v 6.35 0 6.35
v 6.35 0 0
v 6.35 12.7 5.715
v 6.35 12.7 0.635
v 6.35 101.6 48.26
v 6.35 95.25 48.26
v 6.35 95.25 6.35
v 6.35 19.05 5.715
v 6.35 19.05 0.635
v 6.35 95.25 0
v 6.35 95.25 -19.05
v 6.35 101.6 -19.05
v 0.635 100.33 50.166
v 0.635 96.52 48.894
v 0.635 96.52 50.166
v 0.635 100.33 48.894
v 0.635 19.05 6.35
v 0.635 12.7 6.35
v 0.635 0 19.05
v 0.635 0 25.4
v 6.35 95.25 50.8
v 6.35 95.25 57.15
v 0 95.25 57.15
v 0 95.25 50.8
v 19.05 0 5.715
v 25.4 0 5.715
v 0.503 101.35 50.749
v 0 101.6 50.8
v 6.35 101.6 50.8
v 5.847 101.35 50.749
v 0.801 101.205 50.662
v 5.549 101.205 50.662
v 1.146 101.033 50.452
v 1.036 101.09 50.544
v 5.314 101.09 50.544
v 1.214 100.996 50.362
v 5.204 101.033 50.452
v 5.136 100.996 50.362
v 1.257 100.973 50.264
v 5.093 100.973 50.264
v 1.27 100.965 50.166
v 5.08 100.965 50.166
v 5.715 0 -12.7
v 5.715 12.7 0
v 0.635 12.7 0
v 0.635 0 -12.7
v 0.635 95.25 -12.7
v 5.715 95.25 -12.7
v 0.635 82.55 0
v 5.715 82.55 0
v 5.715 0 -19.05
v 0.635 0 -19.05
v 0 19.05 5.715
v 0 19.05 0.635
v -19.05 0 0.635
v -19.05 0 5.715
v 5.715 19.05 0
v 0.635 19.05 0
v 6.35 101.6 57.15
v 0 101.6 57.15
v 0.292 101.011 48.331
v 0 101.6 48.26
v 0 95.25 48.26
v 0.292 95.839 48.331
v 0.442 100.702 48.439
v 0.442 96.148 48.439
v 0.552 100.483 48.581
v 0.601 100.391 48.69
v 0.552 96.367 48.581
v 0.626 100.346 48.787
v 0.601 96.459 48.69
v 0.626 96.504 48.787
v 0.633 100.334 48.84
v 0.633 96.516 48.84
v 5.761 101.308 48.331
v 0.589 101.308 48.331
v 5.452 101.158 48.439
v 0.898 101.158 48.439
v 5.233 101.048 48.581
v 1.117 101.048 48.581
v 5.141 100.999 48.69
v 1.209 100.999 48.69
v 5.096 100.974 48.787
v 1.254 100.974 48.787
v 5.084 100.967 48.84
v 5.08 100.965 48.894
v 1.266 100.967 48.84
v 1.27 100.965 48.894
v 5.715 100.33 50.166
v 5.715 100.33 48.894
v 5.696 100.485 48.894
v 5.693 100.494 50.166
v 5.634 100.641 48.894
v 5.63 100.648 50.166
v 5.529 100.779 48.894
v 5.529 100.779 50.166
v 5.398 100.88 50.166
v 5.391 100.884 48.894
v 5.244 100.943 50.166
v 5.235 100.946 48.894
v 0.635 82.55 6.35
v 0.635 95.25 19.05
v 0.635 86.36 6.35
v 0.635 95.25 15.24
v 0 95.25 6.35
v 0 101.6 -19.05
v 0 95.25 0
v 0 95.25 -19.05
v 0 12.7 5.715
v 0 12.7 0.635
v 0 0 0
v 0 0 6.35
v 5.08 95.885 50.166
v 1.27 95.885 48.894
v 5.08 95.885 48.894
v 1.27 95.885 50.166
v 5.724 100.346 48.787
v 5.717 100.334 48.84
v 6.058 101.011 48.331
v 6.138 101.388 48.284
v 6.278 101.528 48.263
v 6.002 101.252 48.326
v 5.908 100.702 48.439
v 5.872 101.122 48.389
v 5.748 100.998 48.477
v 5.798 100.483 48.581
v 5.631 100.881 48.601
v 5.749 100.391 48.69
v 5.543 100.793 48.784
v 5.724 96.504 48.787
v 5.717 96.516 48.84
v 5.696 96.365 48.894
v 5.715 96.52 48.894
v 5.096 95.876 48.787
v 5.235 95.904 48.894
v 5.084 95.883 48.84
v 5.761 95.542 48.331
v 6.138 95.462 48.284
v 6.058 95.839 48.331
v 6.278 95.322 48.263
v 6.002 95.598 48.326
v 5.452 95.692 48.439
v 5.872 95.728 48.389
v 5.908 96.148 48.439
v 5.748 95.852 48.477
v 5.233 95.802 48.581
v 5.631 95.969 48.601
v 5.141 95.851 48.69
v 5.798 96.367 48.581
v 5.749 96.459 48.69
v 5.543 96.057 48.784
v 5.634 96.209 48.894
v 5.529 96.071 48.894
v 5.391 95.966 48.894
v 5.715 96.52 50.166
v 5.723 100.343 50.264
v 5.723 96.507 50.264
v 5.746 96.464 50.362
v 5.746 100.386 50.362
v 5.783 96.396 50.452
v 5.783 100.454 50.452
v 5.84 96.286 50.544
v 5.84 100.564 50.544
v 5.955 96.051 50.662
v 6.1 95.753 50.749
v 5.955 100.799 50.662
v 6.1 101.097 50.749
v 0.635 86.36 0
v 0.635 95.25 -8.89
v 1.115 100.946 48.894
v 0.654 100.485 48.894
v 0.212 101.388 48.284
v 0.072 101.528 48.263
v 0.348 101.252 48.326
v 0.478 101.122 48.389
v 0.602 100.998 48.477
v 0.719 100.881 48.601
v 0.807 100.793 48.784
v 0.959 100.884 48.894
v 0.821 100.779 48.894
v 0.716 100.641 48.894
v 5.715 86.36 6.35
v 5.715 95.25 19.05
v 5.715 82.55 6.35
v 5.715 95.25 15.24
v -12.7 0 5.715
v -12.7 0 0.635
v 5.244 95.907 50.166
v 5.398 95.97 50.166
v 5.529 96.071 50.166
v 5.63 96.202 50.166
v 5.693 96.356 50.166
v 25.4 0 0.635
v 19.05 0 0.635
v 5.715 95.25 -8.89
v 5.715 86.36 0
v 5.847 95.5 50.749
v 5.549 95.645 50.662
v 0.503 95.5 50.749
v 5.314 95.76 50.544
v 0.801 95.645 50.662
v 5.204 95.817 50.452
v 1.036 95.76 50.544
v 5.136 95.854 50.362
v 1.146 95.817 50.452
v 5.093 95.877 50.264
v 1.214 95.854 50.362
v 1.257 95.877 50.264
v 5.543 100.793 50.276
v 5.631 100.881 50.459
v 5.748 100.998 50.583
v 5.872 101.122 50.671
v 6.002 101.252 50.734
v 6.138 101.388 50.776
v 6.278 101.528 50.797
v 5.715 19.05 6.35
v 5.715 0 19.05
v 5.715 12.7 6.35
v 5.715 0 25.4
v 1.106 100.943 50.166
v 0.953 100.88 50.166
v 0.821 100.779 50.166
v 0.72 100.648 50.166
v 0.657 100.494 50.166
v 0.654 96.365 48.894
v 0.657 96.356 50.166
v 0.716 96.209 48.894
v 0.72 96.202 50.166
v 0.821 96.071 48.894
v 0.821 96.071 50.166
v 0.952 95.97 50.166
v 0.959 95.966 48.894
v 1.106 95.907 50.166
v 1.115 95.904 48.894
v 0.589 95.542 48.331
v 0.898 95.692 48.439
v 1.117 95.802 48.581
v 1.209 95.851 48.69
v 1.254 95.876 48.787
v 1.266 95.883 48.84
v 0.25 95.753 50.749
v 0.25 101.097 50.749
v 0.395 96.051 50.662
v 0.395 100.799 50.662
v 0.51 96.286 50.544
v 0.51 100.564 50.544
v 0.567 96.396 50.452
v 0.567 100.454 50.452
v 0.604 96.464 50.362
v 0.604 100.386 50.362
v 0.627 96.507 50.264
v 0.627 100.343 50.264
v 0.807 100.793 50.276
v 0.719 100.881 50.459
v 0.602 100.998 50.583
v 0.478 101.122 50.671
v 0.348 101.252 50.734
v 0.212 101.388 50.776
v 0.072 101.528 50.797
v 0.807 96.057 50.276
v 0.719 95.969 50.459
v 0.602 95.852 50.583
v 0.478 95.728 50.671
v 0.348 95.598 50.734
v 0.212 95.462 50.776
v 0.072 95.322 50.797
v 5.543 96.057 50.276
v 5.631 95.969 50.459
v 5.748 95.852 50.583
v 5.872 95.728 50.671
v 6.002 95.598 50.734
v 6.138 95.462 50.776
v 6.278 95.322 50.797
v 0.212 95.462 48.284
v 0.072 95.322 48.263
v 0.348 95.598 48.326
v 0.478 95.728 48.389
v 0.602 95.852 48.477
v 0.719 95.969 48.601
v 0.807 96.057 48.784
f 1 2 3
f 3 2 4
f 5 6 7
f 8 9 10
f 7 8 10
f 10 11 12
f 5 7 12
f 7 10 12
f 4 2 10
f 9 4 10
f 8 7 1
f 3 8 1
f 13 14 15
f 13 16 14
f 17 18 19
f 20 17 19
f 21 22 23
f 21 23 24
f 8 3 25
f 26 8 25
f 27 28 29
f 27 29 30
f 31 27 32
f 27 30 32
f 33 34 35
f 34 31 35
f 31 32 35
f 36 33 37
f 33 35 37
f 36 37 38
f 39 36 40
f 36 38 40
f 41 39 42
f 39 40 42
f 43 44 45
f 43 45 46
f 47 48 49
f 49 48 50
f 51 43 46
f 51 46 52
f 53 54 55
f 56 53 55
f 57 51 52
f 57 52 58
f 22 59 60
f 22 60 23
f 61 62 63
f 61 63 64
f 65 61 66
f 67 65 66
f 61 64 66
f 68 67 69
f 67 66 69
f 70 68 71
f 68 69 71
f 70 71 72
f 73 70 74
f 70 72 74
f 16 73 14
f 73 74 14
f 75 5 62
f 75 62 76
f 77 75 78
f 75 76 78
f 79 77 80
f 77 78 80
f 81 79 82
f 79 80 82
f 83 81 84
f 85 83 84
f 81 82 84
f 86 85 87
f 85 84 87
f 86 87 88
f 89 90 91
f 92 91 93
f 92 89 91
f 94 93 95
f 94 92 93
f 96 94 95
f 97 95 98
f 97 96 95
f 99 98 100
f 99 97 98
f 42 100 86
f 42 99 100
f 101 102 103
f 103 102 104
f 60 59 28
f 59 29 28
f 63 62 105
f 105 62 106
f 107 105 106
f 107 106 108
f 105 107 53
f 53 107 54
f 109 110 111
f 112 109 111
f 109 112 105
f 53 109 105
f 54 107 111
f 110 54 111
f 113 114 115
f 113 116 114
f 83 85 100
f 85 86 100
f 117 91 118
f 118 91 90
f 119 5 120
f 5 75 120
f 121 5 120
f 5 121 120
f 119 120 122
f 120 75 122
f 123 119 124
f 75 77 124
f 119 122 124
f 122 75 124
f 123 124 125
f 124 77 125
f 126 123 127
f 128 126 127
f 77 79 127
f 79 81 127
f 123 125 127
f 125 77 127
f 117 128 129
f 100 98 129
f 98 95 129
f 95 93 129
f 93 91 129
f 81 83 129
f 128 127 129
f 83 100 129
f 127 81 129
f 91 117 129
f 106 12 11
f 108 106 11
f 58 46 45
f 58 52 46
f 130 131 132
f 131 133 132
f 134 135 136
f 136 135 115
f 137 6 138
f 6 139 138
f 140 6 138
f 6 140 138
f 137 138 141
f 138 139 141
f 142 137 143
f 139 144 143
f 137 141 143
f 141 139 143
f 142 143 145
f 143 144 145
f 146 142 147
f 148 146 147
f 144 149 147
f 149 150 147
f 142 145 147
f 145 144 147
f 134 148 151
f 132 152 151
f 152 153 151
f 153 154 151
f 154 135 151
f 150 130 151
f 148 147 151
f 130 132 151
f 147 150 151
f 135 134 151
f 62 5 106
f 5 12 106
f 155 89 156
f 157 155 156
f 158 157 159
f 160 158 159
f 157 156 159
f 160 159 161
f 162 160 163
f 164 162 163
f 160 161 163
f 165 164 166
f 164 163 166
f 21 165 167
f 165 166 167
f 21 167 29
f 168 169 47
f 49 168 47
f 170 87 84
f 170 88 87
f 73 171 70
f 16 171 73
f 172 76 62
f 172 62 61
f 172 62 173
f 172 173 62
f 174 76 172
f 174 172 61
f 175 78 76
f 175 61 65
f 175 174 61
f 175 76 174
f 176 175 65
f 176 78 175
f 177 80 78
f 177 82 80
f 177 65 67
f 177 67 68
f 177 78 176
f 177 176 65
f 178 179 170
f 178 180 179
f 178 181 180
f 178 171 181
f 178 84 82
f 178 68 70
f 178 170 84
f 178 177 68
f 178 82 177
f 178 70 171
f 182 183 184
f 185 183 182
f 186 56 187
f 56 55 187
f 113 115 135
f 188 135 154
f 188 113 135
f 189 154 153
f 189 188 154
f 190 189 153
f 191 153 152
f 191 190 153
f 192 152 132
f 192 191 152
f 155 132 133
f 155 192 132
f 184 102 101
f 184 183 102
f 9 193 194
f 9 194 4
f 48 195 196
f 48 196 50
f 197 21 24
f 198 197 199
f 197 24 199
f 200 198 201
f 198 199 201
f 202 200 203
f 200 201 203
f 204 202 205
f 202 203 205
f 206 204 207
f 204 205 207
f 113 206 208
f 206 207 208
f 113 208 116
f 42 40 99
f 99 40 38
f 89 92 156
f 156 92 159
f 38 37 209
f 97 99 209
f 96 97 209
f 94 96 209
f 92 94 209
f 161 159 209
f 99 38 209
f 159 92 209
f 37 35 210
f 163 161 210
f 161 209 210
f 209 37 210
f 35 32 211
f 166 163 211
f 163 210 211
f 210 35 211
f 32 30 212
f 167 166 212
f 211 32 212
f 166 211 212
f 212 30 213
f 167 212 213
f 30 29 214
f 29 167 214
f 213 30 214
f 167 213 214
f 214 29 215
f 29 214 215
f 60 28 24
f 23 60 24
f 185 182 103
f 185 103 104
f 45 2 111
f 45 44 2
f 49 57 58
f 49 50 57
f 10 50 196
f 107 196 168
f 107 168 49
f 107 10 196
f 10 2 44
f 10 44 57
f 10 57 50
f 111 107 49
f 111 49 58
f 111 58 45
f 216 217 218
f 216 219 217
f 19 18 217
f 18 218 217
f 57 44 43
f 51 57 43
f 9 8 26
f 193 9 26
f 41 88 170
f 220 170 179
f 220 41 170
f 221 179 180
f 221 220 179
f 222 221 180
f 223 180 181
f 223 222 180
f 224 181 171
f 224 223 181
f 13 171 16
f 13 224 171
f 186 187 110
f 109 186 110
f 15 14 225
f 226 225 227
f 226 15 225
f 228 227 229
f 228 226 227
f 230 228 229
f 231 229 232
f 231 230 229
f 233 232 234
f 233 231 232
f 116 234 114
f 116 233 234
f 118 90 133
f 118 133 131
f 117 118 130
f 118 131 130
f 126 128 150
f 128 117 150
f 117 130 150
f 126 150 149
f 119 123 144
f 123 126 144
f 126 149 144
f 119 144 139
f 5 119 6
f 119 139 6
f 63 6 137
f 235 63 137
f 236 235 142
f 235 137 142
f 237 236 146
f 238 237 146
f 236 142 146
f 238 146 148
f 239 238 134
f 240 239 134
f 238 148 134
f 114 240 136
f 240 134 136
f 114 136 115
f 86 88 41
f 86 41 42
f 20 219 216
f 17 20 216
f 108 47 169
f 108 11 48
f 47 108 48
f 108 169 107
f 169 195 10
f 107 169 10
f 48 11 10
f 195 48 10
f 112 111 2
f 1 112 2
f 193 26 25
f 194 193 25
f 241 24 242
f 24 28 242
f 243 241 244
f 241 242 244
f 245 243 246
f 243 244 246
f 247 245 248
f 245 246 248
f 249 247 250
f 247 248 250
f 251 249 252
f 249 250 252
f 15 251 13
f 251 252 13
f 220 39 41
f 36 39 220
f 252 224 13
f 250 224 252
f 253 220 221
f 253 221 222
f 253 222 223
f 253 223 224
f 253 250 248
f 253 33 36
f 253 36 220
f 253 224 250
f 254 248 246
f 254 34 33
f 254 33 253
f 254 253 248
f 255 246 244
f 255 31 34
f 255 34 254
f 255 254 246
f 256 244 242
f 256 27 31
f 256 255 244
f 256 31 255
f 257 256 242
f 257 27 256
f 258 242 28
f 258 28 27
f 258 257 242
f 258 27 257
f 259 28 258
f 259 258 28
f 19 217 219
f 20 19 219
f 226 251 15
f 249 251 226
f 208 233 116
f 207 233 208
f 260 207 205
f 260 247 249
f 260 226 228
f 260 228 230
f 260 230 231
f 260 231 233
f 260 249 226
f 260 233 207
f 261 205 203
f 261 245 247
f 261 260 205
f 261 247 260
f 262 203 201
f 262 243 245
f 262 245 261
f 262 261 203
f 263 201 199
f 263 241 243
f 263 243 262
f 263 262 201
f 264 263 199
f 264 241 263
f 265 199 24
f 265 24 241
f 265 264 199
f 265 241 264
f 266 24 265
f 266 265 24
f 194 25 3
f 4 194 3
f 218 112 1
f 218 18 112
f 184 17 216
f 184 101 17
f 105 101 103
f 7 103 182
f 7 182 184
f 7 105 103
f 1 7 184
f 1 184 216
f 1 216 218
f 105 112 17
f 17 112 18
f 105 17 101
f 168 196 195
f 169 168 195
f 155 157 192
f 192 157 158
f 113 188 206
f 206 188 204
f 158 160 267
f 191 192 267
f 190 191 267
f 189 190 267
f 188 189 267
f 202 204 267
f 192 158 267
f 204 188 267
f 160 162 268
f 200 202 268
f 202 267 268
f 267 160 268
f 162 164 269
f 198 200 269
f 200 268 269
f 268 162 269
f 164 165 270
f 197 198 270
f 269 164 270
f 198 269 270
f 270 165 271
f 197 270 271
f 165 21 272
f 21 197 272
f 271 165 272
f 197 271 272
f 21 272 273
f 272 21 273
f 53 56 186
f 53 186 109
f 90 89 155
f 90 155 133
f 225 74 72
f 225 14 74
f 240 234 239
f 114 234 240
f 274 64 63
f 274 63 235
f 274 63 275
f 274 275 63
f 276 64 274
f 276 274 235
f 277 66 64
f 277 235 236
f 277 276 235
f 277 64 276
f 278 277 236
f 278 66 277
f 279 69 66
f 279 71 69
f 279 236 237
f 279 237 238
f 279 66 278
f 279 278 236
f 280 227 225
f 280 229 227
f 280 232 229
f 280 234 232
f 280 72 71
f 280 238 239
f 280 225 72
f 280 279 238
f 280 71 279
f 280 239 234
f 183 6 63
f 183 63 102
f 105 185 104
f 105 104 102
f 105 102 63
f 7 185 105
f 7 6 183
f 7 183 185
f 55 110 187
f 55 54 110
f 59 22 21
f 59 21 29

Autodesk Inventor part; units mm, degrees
ref_plane "YZ Plane" through (0, 0, 0) normal (1, 0, 0) x (0, 1, 0)
ref_plane "XZ Plane" through (0, 0, 0) normal (0, 1, 0) x (-1, 0, 0)
ref_plane "XY Plane" through (0, 0, 0) normal (0, 0, 1) x (1, 0, 0)
sketch "Sketch1" plane through (0, 0, 0) normal (0, 0, 1) x (1, 0, 0)
  line L0 (0, 0) -> (6.35, 0)
  line L1 (6.35, 0) -> (6.35, 101.6)
  line L2 (6.35, 101.6) -> (0, 101.6)
  line L3 (0, 101.6) -> (0, 0)
  dimension "d0" = 6.35
  dimension "d1" = 101.6
extrude "Extrusion1" add sketch "Sketch1" along normal blind 6.35
sketch "Sketch2" plane through (6.35, 0, 0) normal (1, 0, 0) x (0, 0, -1)
  line L0 (-19.05, 0) -> (-25.4, 0)
  line L1 (-25.4, 0) -> (-6.35, 19.05)
  line L2 (-6.35, 0) -> (-6.35, 101.6) projected
  line L3 (-25.4, 0) -> (1.5408, 0) construction
  line L4 (-6.35, 19.05) -> (-6.35, 12.7)
  line L5 (-6.35, 12.7) -> (-19.05, 0)
  point P0 (0, 0)
  dimension "d5" = 19.05
  dimension "d6" = 45
  dimension "d7" = 6.35
extrude "Extrusion2" add sketch "Sketch2" against normal blind 6.35
sketch "Sketch3" plane through (6.35, 0, 0) normal (1, 0, 0) x (0, 0, -1)
  line L0 (12.7, 0) -> (19.05, 0)
  line L1 (19.05, 0) -> (0, 19.05)
  line L2 (0, 101.6) -> (0, 0) projected
  line L3 (0, 19.05) -> (0, 12.7)
  line L4 (0, 12.7) -> (12.7, 0)
  dimension "d10" = 19.05
  dimension "d11" = 45
  dimension "d12" = 6.35
extrude "Extrusion3" add sketch "Sketch3" against normal blind 6.35
sketch "Sketch4" plane through (0, 0, 6.35) normal (0, 0, 1) x (1, 0, 0)
  line L0 (6.35, 19.05) -> (25.4, 0)
  line L1 (6.35, 19.05) -> (33.2908, 19.05) construction
  line L2 (25.4, 0) -> (19.05, 0)
  line L3 (0, 0) -> (6.35, 0) projected
  line L4 (19.05, 0) -> (6.35, 12.7)
  line L5 (6.35, 12.7) -> (6.35, 19.05)
  line L6 (6.35, 0) -> (6.35, 12.7) projected
  dimension "d15" = 45
  dimension "d16" = 6.35
extrude "Extrusion4" add sketch "Sketch4" against normal blind 6.35
sketch "Sketch5" plane through (0, 0, 0) normal (0, 0, -1) x (-1, 0, 0)
  line L0 (0, 19.05) -> (19.05, 0)
  line L1 (0, 19.05) -> (26.9408, 19.05) construction
  line L2 (19.05, 0) -> (12.7, 0)
  line L3 (0, 19.05) -> (0, 0) projected
  line L4 (12.7, 0) -> (0, 12.7)
  line L5 (0, 12.7) -> (0, 19.05)
  dimension "d19" = 45
  dimension "d20" = 6.35
extrude "Extrusion5" add sketch "Sketch5" against normal blind 6.35
sketch "Sketch6" plane through (6.35, 101.6, 6.35) normal (1, 0, 0) x (0, 0, -1)
  line L0 (0, 0) -> (-50.8, 0)
  line L1 (-50.8, 0) -> (-50.8, -6.35)
  line L2 (-50.8, -6.35) -> (0, -6.35)
  line L3 (0, -6.35) -> (0, 0)
  line L4 (6.35, 0) -> (25.4, 0)
  line L5 (25.4, 0) -> (25.4, -6.35)
  line L6 (25.4, -6.35) -> (6.35, -6.35)
  line L7 (6.35, -6.35) -> (6.35, 0)
  point P0 (6.35, -101.6)
  dimension "d23" = 50.8
  dimension "d24" = 6.35
  dimension "d25" = 19.05
extrude "Extrusion6" add sketch "Sketch6" against normal blind 6.35
sketch "Sketch7" plane through (6.35, 19.05, 6.35) normal (1, 0, 0) x (0, 0, -1)
  line L0 (-8.89, 76.2) -> (-12.7, 76.2)
  line L1 (-50.8, 76.2) -> (0, 76.2) projected
  line L2 (-12.7, 76.2) -> (0, 63.5)
  line L3 (0, 0) -> (0, 76.2) projected
  line L4 (0, 63.5) -> (0, 67.31)
  line L5 (0, 67.31) -> (-8.89, 76.2)
  point P0 (6.35, -19.05)
  dimension "d28" = 12.7
  dimension "d29" = 45
  dimension "d30" = 3.81
extrude "Extrusion7" add sketch "Sketch7" against normal blind 5.715 contours L5 L3 L2 L0
extrude "Extrusion8" cut sketch "Sketch7" against normal blind 0.635 contours L5 L3 L2 L0
sketch "Sketch9" plane through (0, 0, 6.35) normal (0, 0, 1) x (1, 0, 0)
  point P0 (0, 0)
extrude "Extrusion9" cut sketch "Sketch4" against normal blind 0.635
sketch "Sketch10" plane through (0, 0, 0) normal (0, 0, -1) x (-1, 0, 0)
  line L0 (-25.4, 0) -> (-19.05, 0)
  line L1 (-25.4, 0) -> (-19.05, 0) projected
  line L2 (-19.05, 0) -> (-6.35, 12.7)
  line L3 (-19.05, 0) -> (-6.35, 12.7) projected
  line L4 (-6.35, 12.7) -> (-6.35, 19.05)
  line L5 (-6.35, 0) -> (-6.35, 19.05) projected
  line L6 (-6.35, 19.05) -> (-25.4, 0)
  line L7 (-6.35, 19.05) -> (-25.4, 0) projected
  point P0 (0, 0)
extrude "Extrusion10" cut sketch "Sketch10" against normal blind 0.635
sketch "Sketch11" plane through (6.35, 0, 6.35) normal (1, 0, 0) x (0, 0, -1)
  line L0 (6.35, 19.05) -> (6.35, 12.7)
  line L1 (6.35, 0) -> (6.35, 12.7) projected
  line L2 (6.35, 12.7) -> (19.05, 0)
  line L3 (6.35, 12.7) -> (19.05, 0) projected
  line L4 (19.05, 0) -> (25.4, 0)
  line L5 (19.05, 0) -> (25.4, 0) projected
  line L6 (25.4, 0) -> (6.35, 19.05)
  line L7 (25.4, 0) -> (6.35, 19.05) projected
extrude "Extrusion11" cut sketch "Sketch11" against normal blind 0.635
sketch "Sketch12" plane through (0, 0, -19.05) normal (-1, 0, 0) x (0, 0, 1)
  line L0 (0, 0) -> (6.35, 0)
  line L1 (0, 0) -> (6.35, 0) projected
  line L2 (6.35, 0) -> (19.05, 12.7)
  line L3 (6.35, 0) -> (19.05, 12.7) projected
  line L4 (19.05, 12.7) -> (19.05, 19.05)
  line L5 (19.05, 95.25) -> (19.05, 19.05) projected
  line L6 (19.05, 19.05) -> (0, 0)
  line L7 (19.05, 19.05) -> (0, 0) projected
  point P0 (19.05, 0)
extrude "Extrusion12" cut sketch "Sketch12" against normal blind 0.635
sketch "Sketch13" plane through (0, 0, 0) normal (0, 0, -1) x (-1, 0, 0)
  line L0 (0, 19.05) -> (0, 12.7)
  line L1 (0, 12.7) -> (12.7, 0)
  line L2 (0, 12.7) -> (12.7, 0) projected
  line L3 (12.7, 0) -> (19.05, 0)
  line L4 (19.05, 0) -> (0, 19.05)
  line L5 (19.05, 0) -> (0, 19.05) projected
  point P0 (0, 0)
extrude "Extrusion13" cut sketch "Sketch13" against normal blind 0.635
sketch "Sketch14" plane through (0, 0, 6.35) normal (0, 0, 1) x (1, 0, 0)
  line L0 (-19.05, 0) -> (-12.7, 0)
  line L1 (-19.05, 0) -> (-12.7, 0) projected
  line L2 (-12.7, 0) -> (0, 12.7)
  line L3 (-12.7, 0) -> (0, 12.7) projected
  line L4 (0, 12.7) -> (0, 19.05)
  line L5 (0, 12.7) -> (0, 19.05) projected
  line L6 (0, 19.05) -> (-19.05, 0)
  line L7 (0, 19.05) -> (-19.05, 0) projected
  point P0 (0, 0)
extrude "Extrusion14" cut sketch "Sketch14" against normal blind 0.635
sketch "Sketch15" plane through (0, 0, 0) normal (-1, 0, 0) x (0, 0, 1)
  line L0 (6.35, 19.05) -> (25.4, 0)
  line L1 (6.35, 19.05) -> (25.4, 0) projected
  line L2 (25.4, 0) -> (19.05, 0)
  line L3 (25.4, 0) -> (19.05, 0) projected
  line L4 (19.05, 0) -> (6.35, 12.7)
  line L5 (6.35, 12.7) -> (6.35, 19.05)
  point P0 (0, 0)
extrude "Extrusion15" cut sketch "Sketch15" against normal blind 0.635
sketch "Sketch16" plane through (6.35, 0, 6.35) normal (1, 0, 0) x (0, 0, -1)
  line L0 (-19.05, 0) -> (-12.7, 0)
  line L1 (-19.05, 0) -> (-12.7, 0) projected
  line L2 (-12.7, 0) -> (0, 12.7)
  line L3 (0, 19.05) -> (-19.05, 0) projected
  line L4 (0, 12.7) -> (0, 19.05)
  line L5 (0, 95.25) -> (0, 0) projected
  line L6 (0, 19.05) -> (-19.05, 0)
  point P0 (6.35, 0)
extrude "Extrusion16" cut sketch "Sketch16" against normal blind 0.635
sketch "Sketch17" plane through (6.35, 0, 6.35) normal (1, 0, 0) x (0, 0, -1)
  line L0 (15.24, 95.25) -> (19.05, 95.25)
  line L1 (25.4, 95.25) -> (6.35, 95.25) projected
  line L2 (19.05, 95.25) -> (6.35, 82.55)
  line L3 (6.35, 0) -> (6.35, 95.25) projected
  line L4 (6.35, 82.55) -> (6.35, 86.36)
  line L5 (6.35, 86.36) -> (15.24, 95.25)
  line L6 (6.35, 86.36) -> (18.9224, 86.36) construction
  dimension "d51" = 12.7
  dimension "d52" = 45
  dimension "d53" = 45
extrude "Extrusion17" add sketch "Sketch17" against normal blind 5.715 contours L0 L2 L3 L5
sketch "Sketch18" plane through (6.35, 0, 6.35) normal (1, 0, 0) x (0, 0, -1)
  line L0 (6.35, 86.36) -> (6.35, 82.55)
  line L1 (6.35, 95.25) -> (6.35, 0) projected
  line L2 (6.35, 82.55) -> (19.05, 95.25)
  line L3 (19.05, 95.25) -> (6.35, 82.55) projected
  line L4 (19.05, 95.25) -> (15.24, 95.25)
  line L5 (25.4, 95.25) -> (6.35, 95.25) projected
  line L6 (15.24, 95.25) -> (6.35, 86.36)
  line L7 (15.24, 95.25) -> (6.35, 86.36) projected
extrude "Extrusion18" cut sketch "Sketch18" against normal blind 0.635 contours L6 L4 L2 L0
sketch "Sketch19" plane through (6.35, 0, 6.35) normal (1, 0, 0) x (0, 0, -1)
  line L0 (25.4, 101.6) -> (-50.8, 101.6) projected
  line L1 (-50.8, 95.25) -> (0, 95.25) projected
  line L2 (-44.45, 101.6) -> (-41.91, 101.6)
  line L3 (-41.91, 101.6) -> (-41.91, 95.25)
  line L4 (-41.91, 95.25) -> (-44.45, 95.25)
  line L5 (-44.45, 95.25) -> (-44.45, 101.6)
  point P0 (6.35, 0)
  dimension "d58" = 6.35
  dimension "d59" = 2.54
extrude "Extrusion19" cut sketch "Sketch19" against normal blind 0.635
sketch "Sketch20" plane through (0, 101.6, -19.05) normal (0, 1, 0) x (1, 0, 0)
  line L0 (0, -25.4) -> (0, -76.2) projected
  line L1 (5.715, -67.31) -> (0, -67.31)
  line L2 (0, -67.31) -> (0, -69.85)
  line L3 (0, -69.85) -> (5.715, -69.85)
  line L4 (5.715, -69.85) -> (5.715, -67.31)
  point P0 (0, -19.05)
extrude "Extrusion20" cut sketch "Sketch20" against normal blind 0.635
sketch "Sketch21" plane through (0, 0, 0) normal (-1, 0, 0) x (0, 0, 1)
  line L0 (50.8, 100.965) -> (48.26, 100.965)
  line L1 (48.26, 100.965) -> (48.26, 95.25)
  line L2 (48.26, 95.25) -> (50.8, 95.25)
  line L3 (50.8, 95.25) -> (50.8, 100.965)
  point P0 (0, 0)
extrude "Extrusion21" cut sketch "Sketch21" against normal blind 0.635
sketch "Sketch22" plane through (0, 95.25, 6.35) normal (0, -1, 0) x (1, 0, 0)
  line L0 (0.635, 41.91) -> (5.715, 41.91)
  line L1 (5.715, 41.91) -> (5.715, 44.45)
  line L2 (5.715, 44.45) -> (0.635, 44.45)
  line L3 (0.635, 44.45) -> (0.635, 41.91)
  point P0 (0, -6.35)
extrude "Extrusion22" cut sketch "Sketch22" against normal blind 0.635
fillet "Fillet1" radius 0.635 8 edges at (3.175, 100.965, 48.26) (5.715, 98.425, 48.26) (3.175, 100.965, 50.8) (5.715, 98.425, 50.8) (0.635, 98.425, 48.26) (3.175, 95.885, 48.26) (0.635, 98.425, 50.8) (3.175, 95.885, 50.8)
fillet "Fillet2" radius 0.635 12 edges at (0.4492, 95.6992, 50.6142) (0.4492, 95.6992, 48.4458) (0.635, 95.885, 49.53) (0.4492, 101.1508, 50.6142) (0.4492, 101.1508, 48.4458) (0.635, 100.965, 49.53) (5.9008, 95.6992, 48.4458) (5.9008, 95.6992, 50.6142) (5.715, 95.885, 49.53) (5.9008, 101.1508, 50.6142) (5.9008, 101.1508, 48.4458) (5.715, 100.965, 49.53)
properties part number "Gallows 1" material "Wood (Birch)"
